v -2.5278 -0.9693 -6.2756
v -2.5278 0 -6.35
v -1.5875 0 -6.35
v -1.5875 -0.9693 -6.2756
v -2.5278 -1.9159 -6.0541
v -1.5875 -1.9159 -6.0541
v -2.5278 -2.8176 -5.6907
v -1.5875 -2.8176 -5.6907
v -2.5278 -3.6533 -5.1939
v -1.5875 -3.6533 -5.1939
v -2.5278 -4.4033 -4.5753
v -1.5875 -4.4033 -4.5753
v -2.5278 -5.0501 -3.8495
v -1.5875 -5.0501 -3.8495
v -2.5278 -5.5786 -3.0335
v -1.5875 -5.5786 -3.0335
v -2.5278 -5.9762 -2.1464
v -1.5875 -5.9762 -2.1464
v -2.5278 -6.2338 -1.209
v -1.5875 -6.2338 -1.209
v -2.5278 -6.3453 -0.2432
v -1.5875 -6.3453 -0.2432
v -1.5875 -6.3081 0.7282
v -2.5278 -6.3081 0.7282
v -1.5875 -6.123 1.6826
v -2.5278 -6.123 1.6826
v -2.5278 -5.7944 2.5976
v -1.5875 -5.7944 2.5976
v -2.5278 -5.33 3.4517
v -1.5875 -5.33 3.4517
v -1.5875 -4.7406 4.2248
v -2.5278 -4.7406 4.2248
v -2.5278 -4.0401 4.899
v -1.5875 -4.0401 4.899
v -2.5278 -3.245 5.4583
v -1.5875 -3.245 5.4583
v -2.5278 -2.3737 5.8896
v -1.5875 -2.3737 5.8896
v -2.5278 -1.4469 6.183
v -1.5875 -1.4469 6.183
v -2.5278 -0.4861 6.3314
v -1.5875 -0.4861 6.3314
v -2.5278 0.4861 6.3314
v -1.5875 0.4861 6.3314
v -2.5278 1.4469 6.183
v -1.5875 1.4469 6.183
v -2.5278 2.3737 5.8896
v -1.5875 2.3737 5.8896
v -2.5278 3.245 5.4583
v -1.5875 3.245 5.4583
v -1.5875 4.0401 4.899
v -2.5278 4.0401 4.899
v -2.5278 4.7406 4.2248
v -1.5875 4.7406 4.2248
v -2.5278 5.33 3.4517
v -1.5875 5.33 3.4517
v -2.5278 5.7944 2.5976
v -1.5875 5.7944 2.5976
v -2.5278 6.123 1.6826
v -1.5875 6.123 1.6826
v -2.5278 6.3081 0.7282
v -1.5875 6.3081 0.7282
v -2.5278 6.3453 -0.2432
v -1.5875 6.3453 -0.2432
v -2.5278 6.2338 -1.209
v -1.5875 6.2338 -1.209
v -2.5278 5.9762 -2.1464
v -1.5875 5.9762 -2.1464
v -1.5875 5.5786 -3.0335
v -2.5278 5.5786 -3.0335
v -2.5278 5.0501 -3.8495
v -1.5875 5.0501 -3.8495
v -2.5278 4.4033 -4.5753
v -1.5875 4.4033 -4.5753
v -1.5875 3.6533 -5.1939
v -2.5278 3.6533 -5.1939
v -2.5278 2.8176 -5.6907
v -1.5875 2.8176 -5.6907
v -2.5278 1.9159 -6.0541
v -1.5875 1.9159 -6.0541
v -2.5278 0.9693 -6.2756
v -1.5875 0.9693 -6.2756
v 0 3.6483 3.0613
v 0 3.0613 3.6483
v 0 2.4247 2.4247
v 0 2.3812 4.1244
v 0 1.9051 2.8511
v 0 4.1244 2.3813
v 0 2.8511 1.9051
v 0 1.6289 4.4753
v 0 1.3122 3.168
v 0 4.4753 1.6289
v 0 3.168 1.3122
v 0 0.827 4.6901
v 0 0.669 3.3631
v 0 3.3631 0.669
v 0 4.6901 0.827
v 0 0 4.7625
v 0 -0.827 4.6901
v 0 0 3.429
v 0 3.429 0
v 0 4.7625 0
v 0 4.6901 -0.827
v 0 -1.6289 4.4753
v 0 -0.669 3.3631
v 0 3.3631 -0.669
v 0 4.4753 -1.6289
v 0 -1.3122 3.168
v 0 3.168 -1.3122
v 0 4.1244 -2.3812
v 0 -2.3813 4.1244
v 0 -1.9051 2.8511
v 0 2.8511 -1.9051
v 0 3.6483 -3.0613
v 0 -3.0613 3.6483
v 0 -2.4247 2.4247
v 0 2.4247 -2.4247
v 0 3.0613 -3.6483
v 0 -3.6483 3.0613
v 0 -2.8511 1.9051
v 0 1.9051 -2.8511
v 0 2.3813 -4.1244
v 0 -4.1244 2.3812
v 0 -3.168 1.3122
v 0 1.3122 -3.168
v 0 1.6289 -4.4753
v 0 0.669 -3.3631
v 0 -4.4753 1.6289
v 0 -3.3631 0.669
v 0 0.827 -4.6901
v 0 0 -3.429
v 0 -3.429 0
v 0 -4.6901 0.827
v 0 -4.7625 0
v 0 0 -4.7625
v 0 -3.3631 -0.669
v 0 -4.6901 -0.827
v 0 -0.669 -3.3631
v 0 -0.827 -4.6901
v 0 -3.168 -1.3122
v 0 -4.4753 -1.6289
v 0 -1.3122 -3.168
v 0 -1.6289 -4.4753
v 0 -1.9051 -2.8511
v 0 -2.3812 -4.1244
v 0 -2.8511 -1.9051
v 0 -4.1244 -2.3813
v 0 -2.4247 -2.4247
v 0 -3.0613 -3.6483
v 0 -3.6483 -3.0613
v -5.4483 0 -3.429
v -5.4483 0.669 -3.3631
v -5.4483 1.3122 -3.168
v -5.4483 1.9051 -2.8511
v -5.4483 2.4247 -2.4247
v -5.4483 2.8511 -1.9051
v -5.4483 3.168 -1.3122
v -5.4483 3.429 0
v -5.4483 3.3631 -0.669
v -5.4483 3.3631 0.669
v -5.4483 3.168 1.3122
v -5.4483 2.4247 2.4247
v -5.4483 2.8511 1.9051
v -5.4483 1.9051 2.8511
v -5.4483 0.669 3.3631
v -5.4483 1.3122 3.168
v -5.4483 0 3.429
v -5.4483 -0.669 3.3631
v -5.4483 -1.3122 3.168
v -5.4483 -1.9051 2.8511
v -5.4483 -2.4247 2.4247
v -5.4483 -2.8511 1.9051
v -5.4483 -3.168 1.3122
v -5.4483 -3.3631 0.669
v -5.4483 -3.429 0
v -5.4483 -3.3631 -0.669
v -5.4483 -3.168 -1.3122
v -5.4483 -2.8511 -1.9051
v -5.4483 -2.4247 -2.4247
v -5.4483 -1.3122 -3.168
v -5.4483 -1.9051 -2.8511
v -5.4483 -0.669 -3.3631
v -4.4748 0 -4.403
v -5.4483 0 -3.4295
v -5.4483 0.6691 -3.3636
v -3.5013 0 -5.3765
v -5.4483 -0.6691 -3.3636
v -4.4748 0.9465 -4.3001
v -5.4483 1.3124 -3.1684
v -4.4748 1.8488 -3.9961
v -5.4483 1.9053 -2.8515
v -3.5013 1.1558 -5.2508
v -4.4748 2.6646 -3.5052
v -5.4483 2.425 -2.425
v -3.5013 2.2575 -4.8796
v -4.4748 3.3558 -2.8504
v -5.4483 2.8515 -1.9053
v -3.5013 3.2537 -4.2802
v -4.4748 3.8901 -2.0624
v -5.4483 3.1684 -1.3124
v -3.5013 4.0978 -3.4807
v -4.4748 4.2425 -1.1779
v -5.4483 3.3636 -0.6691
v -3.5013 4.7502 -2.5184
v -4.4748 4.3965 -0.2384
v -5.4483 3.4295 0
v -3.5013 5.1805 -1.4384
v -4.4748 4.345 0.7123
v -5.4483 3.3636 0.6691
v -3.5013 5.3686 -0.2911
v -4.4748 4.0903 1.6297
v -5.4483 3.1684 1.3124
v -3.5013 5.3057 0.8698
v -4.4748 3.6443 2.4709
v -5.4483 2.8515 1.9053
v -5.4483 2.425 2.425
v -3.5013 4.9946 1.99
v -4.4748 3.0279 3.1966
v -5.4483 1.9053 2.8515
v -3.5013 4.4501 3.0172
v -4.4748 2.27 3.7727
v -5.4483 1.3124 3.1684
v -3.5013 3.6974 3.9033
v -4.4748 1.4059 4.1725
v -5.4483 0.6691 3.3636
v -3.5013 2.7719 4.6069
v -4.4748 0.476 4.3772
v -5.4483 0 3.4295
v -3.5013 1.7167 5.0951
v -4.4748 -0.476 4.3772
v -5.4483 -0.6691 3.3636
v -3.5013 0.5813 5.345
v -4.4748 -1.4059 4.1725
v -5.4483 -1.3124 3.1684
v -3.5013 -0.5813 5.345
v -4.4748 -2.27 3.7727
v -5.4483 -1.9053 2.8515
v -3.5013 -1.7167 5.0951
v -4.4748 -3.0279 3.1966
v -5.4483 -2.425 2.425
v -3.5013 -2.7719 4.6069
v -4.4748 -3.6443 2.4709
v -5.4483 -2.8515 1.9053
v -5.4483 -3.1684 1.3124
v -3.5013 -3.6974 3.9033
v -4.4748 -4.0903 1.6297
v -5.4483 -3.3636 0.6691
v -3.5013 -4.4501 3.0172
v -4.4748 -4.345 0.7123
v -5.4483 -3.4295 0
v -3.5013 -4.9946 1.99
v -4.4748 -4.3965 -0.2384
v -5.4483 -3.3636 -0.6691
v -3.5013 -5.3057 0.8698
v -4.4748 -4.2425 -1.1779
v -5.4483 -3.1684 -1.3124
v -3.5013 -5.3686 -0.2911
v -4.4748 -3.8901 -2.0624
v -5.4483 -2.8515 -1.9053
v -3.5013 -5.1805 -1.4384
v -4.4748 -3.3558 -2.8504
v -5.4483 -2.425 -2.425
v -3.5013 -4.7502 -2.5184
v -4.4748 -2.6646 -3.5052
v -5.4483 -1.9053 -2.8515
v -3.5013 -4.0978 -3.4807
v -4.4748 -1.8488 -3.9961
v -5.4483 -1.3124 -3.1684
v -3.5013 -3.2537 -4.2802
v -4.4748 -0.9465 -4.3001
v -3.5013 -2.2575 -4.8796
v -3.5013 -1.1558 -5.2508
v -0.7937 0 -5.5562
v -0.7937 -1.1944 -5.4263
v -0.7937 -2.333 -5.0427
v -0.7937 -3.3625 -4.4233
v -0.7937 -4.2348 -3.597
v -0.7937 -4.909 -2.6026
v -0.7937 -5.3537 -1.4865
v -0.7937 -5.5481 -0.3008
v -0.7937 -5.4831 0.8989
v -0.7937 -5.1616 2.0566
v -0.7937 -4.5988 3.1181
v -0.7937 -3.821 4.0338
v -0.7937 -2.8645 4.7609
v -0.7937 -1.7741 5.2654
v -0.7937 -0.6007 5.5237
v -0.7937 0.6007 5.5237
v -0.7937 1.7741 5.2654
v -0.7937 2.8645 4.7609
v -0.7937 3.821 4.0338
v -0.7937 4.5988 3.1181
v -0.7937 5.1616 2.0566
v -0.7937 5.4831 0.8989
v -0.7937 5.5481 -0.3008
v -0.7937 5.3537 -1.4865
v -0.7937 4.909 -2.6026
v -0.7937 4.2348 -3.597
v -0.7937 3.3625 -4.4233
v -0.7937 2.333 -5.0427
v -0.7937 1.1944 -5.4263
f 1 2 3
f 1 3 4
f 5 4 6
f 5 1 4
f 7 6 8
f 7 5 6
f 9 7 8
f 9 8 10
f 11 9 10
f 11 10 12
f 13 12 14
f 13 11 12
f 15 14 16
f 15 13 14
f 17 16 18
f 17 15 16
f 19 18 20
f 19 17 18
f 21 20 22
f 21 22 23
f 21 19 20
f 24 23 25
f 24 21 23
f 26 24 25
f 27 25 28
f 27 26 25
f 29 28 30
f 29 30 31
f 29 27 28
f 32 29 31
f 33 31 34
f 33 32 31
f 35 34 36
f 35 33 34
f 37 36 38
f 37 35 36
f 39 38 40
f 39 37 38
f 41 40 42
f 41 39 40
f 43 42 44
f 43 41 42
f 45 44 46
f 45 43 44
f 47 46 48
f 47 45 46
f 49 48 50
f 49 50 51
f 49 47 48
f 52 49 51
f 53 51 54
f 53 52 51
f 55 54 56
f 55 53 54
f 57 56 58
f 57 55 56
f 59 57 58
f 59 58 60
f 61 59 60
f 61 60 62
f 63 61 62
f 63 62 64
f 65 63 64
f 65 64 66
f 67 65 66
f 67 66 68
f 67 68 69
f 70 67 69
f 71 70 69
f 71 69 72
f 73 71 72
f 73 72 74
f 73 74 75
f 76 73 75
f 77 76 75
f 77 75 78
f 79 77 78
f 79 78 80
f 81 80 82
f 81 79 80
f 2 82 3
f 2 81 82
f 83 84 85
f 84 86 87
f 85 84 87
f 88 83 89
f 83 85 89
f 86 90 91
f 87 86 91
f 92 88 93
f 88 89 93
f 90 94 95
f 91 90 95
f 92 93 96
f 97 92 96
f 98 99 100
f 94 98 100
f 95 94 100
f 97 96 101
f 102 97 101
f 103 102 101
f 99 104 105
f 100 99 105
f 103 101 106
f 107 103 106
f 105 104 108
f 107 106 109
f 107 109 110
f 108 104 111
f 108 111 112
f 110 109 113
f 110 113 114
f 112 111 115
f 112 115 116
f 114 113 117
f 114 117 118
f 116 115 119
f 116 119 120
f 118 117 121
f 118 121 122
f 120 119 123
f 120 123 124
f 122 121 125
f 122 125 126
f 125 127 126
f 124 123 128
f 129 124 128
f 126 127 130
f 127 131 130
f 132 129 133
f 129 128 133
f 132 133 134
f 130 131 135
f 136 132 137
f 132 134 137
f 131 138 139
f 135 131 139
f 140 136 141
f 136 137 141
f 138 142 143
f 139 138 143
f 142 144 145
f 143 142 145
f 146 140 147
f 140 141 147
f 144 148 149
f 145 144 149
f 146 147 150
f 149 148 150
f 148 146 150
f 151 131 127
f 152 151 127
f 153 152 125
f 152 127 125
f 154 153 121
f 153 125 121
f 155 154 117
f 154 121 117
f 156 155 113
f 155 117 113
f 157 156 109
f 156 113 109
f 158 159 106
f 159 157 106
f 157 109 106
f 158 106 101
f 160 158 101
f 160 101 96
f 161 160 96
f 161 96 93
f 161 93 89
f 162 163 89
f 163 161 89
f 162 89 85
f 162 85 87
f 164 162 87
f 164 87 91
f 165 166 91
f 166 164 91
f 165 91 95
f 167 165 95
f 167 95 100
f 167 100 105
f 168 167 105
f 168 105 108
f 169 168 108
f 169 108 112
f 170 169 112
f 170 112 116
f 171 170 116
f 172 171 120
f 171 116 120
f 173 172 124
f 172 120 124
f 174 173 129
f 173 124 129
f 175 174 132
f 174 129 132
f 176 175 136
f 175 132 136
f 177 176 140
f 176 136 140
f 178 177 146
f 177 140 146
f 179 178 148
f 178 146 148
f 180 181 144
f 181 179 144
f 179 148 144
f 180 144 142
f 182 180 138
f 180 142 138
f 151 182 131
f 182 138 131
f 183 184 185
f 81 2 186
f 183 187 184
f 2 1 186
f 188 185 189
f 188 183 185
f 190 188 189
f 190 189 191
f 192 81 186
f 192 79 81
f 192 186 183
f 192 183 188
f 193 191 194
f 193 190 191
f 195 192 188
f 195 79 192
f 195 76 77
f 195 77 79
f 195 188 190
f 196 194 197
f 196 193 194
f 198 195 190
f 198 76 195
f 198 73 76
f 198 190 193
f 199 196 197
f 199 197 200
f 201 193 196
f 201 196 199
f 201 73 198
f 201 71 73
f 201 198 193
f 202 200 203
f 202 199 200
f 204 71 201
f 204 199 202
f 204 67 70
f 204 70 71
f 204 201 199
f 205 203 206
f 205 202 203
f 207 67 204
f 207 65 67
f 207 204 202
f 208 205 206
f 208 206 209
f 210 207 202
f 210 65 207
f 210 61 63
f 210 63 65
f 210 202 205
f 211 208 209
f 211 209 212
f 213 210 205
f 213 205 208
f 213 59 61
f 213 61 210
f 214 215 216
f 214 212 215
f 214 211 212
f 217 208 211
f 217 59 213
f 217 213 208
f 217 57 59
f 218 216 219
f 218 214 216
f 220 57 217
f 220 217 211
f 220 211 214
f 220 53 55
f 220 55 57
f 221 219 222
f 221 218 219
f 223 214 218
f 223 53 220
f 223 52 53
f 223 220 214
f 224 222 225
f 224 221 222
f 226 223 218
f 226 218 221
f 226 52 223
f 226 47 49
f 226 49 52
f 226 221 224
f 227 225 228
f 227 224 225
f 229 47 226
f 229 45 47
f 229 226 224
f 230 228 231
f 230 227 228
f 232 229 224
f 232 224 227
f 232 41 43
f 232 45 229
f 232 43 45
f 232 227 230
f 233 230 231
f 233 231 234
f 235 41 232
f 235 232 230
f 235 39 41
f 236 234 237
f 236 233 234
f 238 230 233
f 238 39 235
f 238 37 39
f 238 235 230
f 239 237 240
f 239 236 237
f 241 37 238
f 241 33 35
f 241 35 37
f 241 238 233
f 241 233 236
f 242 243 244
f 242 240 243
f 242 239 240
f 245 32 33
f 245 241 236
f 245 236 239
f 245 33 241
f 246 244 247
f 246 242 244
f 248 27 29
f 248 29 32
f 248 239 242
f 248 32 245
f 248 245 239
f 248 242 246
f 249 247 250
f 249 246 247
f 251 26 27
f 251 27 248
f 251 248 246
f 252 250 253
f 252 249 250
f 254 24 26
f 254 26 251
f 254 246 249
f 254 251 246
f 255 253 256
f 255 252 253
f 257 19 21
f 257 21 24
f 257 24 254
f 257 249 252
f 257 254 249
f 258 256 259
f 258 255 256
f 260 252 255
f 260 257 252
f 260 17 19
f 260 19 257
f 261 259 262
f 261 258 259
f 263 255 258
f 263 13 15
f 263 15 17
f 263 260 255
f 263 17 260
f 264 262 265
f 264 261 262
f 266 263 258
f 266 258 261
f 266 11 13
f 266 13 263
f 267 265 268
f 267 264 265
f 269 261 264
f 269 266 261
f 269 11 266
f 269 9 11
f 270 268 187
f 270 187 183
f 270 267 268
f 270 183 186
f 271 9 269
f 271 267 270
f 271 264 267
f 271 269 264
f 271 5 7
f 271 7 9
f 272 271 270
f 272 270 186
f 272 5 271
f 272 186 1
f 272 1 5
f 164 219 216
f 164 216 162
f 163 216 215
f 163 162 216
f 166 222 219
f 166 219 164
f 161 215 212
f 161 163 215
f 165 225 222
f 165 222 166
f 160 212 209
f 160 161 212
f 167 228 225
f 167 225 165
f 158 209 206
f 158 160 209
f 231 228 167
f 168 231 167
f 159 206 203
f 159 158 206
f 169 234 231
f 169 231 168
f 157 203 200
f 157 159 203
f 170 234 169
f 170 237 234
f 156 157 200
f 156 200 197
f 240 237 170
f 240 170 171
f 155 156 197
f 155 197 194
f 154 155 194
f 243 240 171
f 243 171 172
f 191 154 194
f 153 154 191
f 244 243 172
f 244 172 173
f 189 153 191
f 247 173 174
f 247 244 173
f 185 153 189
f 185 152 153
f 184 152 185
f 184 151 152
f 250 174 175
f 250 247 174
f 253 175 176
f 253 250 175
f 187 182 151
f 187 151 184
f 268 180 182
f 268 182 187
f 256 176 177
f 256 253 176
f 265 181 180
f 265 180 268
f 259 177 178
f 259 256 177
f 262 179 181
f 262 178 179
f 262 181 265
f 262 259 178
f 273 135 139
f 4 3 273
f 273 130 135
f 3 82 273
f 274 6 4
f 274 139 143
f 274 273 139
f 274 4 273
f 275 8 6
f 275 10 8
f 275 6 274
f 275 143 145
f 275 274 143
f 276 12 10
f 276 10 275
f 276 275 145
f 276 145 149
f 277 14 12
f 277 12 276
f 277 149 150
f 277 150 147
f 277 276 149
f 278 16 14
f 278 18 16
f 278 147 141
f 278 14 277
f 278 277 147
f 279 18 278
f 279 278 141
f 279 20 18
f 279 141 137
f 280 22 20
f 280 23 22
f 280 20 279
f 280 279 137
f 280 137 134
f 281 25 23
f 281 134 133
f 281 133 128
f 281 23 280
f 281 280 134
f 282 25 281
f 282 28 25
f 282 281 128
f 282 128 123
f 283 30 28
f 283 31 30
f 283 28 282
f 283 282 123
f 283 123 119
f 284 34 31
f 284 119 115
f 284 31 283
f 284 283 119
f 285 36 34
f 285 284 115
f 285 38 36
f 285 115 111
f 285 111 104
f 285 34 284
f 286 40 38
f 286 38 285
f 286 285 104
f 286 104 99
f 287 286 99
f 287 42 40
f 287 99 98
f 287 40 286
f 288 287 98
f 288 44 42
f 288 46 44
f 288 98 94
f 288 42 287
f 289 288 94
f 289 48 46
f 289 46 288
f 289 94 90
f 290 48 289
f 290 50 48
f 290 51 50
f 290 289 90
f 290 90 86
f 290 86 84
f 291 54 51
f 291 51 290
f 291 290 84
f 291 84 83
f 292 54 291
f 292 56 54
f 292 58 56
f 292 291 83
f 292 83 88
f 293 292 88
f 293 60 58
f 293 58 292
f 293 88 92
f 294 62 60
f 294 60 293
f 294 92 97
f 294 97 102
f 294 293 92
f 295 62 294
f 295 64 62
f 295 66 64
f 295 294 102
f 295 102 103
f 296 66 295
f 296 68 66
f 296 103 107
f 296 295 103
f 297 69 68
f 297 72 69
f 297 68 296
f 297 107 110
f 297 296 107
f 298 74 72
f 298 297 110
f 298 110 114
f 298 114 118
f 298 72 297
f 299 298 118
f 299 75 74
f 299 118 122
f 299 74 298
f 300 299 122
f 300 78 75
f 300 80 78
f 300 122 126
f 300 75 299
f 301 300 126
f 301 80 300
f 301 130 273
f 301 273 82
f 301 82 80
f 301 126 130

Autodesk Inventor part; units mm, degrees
ref_plane "YZ Plane" through (0, 0, 0) normal (1, 0, 0) x (0, 1, 0)
ref_plane "XZ Plane" through (0, 0, 0) normal (0, 1, 0) x (-1, 0, 0)
ref_plane "XY Plane" through (0, 0, 0) normal (0, 0, 1) x (1, 0, 0)
sketch "Sketch1" plane through (0, 0, 0) normal (0, 1, 0) x (-1, 0, 0)
  line L0 (0, 0) -> (5.4483, 0)
  line L1 (5.4483, 0) -> (5.4483, -3.429) construction
  line L2 (5.4483, -3.429) -> (0, -3.429)
  line L3 (0, -3.429) -> (0, 0) construction
  line L4 (5.4483, -3.429) -> (0, -3.429)
  line L5 (0, -3.429) -> (0, -6.35)
  line L6 (0, -6.35) -> (5.4483, -6.35)
  line L7 (5.4483, -6.35) -> (5.4483, -3.429)
  dimension "d0" = 5.4483
  dimension "d1" = 3.429
  dimension "d2" = 6.35
revolve "Revolution1" add sketch "Sketch1" angle 360 about axis through (0, 0, 0) along (-1, 0, 0)
chamfer "Chamfer1" distance 2.921 angle 45 1 edges at (-5.4483, 0, 6.35)
chamfer "Chamfer2" distance 1.5875 angle 45 1 edges at (0, 0, 6.35)
properties part number "Spacer" material "Nylon 6/6"
